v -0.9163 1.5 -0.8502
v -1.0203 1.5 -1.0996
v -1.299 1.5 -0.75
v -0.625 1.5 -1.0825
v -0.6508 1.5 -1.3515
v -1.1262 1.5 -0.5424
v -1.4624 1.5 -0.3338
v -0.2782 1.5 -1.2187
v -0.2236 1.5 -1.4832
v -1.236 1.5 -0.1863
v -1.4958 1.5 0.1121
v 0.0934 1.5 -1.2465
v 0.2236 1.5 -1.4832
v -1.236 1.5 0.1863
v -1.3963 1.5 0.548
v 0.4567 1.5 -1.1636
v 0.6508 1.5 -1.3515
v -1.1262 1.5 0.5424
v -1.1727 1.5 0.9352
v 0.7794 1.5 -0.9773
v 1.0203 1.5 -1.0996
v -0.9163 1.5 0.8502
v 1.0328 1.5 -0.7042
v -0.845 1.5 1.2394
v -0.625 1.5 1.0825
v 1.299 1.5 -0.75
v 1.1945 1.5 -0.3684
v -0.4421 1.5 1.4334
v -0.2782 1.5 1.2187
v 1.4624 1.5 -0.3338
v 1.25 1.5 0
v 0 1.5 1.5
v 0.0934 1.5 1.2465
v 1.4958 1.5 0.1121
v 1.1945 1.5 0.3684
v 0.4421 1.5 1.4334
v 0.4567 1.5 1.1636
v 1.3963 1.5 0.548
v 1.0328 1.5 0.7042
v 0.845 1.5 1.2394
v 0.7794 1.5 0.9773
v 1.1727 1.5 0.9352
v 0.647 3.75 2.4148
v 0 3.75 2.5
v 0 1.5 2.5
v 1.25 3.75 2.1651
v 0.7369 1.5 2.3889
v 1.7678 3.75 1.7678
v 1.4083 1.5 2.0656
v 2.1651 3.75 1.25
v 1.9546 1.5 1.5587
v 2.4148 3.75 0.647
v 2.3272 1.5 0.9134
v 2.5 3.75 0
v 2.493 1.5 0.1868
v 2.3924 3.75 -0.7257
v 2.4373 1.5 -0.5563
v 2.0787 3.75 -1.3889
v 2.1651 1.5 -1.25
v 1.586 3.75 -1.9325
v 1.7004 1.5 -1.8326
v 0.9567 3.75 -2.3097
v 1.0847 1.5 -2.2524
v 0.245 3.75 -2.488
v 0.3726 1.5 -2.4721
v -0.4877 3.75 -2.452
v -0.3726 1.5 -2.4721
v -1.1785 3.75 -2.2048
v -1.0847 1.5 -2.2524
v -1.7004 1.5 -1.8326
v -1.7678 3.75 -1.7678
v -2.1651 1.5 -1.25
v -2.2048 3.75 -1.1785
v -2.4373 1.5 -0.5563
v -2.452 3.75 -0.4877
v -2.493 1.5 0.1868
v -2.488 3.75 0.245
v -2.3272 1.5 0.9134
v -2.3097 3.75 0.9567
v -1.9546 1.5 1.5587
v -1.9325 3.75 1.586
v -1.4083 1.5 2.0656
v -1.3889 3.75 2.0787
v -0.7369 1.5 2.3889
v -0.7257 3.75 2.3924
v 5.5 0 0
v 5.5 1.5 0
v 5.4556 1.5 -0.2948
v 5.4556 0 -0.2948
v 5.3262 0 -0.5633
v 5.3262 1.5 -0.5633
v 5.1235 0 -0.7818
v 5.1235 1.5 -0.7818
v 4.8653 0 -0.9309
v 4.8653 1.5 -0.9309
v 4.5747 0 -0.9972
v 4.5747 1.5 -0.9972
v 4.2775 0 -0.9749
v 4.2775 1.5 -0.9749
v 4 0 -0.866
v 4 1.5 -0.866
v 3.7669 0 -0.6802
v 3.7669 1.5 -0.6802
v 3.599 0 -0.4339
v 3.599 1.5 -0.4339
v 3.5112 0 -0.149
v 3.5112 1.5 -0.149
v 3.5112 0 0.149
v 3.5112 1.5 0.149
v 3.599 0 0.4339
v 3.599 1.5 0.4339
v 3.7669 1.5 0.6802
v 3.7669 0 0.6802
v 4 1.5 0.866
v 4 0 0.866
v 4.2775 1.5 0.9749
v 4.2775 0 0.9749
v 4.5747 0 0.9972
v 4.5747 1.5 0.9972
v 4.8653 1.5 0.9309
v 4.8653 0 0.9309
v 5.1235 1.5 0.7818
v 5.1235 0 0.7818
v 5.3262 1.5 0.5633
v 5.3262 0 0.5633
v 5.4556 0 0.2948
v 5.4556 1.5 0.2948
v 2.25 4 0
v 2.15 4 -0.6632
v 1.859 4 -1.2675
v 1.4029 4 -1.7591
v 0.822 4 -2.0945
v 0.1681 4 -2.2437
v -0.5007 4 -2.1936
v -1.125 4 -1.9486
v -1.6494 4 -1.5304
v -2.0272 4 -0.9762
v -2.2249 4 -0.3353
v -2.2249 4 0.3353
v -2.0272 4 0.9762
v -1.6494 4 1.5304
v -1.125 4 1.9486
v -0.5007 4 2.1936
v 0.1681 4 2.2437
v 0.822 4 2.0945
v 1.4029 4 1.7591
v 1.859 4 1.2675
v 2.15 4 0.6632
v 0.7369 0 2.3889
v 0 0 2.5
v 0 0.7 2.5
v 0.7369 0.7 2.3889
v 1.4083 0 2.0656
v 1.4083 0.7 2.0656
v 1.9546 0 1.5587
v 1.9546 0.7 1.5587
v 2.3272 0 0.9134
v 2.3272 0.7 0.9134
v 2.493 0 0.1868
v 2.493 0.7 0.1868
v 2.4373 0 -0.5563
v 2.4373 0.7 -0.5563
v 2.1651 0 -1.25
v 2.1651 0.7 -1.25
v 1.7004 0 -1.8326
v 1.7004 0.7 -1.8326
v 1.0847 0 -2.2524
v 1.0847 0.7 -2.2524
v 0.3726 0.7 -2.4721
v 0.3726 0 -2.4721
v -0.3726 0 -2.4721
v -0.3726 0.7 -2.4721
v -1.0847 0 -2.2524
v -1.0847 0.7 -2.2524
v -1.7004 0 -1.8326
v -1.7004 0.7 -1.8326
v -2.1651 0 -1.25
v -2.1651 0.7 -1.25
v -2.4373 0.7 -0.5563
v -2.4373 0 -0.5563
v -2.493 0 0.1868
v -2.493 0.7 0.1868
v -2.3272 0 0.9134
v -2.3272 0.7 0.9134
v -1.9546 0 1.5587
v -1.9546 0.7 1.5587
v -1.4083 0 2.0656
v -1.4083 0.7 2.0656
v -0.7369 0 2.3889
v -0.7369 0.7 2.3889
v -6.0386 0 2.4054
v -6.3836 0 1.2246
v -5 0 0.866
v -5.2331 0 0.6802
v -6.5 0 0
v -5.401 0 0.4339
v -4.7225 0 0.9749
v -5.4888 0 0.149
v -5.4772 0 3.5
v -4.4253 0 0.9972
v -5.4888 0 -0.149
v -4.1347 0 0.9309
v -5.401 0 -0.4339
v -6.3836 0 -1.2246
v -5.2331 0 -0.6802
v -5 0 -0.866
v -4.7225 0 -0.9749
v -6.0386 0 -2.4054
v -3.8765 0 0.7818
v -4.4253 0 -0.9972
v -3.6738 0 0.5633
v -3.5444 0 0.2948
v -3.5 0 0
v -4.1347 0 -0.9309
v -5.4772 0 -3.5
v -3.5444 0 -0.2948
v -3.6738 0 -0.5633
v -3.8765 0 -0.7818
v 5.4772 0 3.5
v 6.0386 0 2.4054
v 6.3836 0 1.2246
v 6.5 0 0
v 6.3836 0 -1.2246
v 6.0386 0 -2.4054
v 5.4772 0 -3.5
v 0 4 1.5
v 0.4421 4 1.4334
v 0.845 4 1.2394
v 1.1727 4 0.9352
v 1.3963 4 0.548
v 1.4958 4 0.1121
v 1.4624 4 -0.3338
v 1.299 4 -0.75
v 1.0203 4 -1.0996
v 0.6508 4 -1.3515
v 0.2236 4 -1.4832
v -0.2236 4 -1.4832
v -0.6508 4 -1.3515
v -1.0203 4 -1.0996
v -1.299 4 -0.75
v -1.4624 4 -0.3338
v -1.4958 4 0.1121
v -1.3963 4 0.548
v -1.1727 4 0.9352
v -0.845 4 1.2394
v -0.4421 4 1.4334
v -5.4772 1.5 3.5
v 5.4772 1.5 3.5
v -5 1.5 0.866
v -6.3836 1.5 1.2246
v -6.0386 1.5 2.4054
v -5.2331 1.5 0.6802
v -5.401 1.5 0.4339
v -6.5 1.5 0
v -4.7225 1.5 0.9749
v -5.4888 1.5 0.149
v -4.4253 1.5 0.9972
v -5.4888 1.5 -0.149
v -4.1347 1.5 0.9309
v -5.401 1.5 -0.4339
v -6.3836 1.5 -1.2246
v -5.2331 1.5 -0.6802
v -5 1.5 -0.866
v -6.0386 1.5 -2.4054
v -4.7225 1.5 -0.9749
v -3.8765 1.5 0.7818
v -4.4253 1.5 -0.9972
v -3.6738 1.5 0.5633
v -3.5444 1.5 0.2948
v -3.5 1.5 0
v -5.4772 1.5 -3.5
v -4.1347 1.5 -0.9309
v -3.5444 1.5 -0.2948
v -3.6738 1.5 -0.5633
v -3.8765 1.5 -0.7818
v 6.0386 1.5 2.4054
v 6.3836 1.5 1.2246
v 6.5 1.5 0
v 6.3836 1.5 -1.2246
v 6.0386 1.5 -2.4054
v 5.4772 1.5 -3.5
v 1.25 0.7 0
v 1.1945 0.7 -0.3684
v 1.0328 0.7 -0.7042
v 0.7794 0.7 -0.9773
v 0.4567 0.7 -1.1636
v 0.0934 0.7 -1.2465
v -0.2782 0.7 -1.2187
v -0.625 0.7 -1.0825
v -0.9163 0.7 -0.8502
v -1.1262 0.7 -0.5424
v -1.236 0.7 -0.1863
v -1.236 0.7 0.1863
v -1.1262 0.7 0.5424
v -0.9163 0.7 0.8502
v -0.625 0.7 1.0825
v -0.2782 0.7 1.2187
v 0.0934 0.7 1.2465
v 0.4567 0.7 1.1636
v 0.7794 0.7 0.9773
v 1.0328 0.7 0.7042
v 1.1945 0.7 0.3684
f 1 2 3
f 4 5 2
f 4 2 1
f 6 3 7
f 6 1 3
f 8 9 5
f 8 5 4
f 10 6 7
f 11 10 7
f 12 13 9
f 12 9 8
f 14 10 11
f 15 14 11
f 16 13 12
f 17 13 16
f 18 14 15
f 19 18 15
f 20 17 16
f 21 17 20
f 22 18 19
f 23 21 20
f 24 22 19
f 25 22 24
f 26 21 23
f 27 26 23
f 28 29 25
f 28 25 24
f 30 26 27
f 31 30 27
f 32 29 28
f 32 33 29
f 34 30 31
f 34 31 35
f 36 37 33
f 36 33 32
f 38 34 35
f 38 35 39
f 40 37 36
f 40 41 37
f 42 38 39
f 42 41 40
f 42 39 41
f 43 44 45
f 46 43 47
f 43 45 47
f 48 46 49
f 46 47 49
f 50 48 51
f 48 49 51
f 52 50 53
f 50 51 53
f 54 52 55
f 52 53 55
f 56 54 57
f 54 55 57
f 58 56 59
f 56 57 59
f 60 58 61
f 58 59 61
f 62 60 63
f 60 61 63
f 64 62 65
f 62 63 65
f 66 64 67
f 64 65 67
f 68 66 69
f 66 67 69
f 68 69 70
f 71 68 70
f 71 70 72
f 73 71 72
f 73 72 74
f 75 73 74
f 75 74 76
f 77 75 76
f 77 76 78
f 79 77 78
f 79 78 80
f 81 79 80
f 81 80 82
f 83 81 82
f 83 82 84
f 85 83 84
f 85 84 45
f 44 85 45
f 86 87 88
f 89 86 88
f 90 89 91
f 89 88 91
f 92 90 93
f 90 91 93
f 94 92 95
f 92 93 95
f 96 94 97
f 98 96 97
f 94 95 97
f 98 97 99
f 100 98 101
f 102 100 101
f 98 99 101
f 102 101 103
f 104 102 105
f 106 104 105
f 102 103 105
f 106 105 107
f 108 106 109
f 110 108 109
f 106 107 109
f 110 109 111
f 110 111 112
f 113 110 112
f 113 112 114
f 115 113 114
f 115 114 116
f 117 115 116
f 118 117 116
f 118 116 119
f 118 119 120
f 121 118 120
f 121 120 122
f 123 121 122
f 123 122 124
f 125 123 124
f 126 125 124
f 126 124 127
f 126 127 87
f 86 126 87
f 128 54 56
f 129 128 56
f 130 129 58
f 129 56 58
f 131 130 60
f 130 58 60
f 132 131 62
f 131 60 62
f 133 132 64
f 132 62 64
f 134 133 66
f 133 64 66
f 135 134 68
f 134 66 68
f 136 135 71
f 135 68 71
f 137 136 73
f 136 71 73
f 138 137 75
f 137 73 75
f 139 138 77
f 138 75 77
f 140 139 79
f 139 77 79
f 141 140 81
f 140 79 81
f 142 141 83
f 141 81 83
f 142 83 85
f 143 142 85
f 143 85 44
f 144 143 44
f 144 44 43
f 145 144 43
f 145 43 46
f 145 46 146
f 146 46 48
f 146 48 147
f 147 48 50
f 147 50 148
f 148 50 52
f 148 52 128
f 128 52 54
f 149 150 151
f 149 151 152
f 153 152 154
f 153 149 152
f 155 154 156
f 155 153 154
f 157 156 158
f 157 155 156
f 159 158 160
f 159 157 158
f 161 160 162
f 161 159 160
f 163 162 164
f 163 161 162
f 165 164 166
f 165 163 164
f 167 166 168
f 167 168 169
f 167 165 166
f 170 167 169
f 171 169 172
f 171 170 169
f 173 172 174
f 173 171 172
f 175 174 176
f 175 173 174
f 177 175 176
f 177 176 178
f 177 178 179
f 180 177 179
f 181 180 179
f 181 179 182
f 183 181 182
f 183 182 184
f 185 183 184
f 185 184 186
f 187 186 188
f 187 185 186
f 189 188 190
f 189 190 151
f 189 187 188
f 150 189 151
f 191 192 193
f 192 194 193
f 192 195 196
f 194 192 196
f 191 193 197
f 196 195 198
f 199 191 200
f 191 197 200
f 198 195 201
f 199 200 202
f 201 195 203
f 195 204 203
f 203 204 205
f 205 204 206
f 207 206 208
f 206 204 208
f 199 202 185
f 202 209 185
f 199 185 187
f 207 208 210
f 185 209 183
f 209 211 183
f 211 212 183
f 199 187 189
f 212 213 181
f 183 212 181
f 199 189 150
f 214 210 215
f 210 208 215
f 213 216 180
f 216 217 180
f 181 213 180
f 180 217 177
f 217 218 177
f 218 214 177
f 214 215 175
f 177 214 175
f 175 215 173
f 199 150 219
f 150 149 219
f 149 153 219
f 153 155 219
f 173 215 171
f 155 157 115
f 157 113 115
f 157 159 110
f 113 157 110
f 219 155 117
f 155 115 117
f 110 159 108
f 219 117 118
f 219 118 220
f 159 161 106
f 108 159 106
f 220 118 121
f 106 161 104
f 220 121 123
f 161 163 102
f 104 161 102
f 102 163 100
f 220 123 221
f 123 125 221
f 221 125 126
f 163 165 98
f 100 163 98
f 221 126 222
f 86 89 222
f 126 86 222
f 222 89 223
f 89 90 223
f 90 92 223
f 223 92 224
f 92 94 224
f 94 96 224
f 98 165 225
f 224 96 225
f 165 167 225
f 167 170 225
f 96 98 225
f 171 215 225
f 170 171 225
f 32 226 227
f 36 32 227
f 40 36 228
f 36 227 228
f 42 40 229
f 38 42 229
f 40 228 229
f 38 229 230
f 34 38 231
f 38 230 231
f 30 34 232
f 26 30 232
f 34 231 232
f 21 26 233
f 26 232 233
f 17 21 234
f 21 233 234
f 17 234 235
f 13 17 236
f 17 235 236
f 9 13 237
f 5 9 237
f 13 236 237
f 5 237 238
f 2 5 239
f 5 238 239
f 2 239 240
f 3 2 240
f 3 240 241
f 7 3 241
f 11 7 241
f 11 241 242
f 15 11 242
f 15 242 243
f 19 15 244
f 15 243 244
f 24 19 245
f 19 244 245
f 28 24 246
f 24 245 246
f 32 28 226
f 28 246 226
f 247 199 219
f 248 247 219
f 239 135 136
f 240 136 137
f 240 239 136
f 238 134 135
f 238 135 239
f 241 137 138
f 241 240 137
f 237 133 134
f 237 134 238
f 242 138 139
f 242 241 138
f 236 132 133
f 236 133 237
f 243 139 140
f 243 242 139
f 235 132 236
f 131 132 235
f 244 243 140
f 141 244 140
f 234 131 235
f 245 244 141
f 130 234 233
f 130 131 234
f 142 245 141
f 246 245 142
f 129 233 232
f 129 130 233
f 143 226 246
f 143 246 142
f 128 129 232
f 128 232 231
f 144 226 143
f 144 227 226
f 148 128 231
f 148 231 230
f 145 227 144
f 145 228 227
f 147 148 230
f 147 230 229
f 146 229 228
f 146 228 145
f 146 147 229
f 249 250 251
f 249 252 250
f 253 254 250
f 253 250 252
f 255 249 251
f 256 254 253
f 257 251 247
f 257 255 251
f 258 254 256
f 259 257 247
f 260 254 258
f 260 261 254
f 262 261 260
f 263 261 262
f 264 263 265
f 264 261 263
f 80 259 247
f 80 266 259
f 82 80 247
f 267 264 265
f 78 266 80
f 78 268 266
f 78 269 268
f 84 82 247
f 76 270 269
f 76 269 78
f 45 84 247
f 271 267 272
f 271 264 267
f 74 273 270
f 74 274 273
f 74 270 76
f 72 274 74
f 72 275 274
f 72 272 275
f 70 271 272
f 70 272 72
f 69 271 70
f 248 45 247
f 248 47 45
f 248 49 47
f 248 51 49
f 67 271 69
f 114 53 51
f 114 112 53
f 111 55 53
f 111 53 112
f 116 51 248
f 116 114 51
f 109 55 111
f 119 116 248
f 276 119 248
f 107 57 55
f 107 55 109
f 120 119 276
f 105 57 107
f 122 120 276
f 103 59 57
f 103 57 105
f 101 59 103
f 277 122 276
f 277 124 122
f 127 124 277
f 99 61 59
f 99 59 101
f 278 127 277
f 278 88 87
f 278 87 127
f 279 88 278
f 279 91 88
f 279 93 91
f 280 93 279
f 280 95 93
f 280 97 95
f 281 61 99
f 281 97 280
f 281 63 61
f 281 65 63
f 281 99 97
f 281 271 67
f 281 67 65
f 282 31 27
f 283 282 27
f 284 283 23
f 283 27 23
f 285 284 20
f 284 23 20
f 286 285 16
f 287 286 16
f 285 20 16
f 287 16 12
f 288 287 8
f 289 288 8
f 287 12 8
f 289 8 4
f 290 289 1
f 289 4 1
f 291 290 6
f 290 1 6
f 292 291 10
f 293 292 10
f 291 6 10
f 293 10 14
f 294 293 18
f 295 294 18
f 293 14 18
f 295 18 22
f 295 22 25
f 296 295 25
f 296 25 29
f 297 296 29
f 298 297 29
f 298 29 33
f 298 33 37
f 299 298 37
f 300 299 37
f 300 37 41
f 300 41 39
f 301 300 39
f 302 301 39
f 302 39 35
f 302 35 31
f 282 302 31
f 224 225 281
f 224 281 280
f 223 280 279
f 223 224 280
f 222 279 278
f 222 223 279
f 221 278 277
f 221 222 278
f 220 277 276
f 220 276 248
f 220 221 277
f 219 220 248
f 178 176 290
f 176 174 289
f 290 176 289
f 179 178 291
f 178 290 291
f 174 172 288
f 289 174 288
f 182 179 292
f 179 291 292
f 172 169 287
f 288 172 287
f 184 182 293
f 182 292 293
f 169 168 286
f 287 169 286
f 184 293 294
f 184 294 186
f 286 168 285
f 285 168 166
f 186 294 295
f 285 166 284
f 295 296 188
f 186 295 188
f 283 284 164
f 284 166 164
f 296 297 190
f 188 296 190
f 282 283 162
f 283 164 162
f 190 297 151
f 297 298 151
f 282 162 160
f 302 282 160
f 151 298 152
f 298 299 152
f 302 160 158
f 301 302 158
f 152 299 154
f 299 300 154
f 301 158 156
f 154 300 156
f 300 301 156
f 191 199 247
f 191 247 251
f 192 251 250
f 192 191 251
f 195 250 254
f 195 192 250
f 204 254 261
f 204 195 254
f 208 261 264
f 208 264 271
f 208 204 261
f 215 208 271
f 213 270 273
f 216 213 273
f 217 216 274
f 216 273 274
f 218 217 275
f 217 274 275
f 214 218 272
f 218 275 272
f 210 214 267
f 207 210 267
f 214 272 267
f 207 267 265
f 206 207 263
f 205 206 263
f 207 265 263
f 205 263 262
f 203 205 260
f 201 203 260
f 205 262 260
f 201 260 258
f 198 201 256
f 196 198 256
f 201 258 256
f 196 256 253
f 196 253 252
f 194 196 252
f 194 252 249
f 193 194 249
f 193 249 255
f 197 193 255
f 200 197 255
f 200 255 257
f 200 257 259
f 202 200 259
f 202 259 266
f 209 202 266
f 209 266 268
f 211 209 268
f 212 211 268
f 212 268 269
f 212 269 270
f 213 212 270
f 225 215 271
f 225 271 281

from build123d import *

# Parameters (mm, degrees)
BASE_SKETCH_W              = 10.95445115
BASE_SKETCH_H              = 7
BASE_EXTRUDE_DEPTH         = 1.5
PROTRUSION_START           = 1.5
F_5MM_DIAMETER_SKETCH_R    = 2.5
PROTRUSION_EXTRUDE_DEPTH   = 2.5
F_5MM_DIAMETER_SKETCH_2_R  = 2.5
F_5MM_BOTTOM_CUT_DEPTH     = 0.7
F_2_0_2_DIAMETER_HOLE1_D   = 2
F_2_5_2_5_DIAMETER_HOLE1_D = 2.5
CUT_EXTRUDE2_START         = 4
F_3MM_DIAMETER_SKETCH_R    = 1.5
CUT_EXTRUDE2_DEPTH         = 2.5


with BuildPart() as part:
    # Base Sketch → Base Extrude (new body)
    with BuildSketch(Plane(origin=(0, 0, 0), x_dir=(1, 0, 0), z_dir=(0, 1, 0))):
        Rectangle(BASE_SKETCH_W, BASE_SKETCH_H)
        with BuildLine():
            ThreePointArc((-5.477225575, -3.5), (-6.5, 0), (-5.477225575, 3.5))
            Line((-5.477225575, 3.5), (-5.477225575, -3.5))
        make_face()
        with BuildLine():
            ThreePointArc((5.477225575, 3.5), (6.5, 0), (5.477225575, -3.5))
            Line((5.477225575, -3.5), (5.477225575, 3.5))
        make_face()
    extrude(amount=BASE_EXTRUDE_DEPTH)

    # 5mm diameter Sketch → Protrusion Extrude (add)
    with BuildSketch(Plane(origin=(0, 0, 0), x_dir=(1, 0, 0), z_dir=(0, 1, 0)).offset(PROTRUSION_START)):
        with Locations(Location((0, 0, 0), (0, 0, 270))):
            Circle(F_5MM_DIAMETER_SKETCH_R)
    extrude(amount=PROTRUSION_EXTRUDE_DEPTH)

    # 5mm diameter Sketch<2> → 5mm Bottom Cut (cut)
    with BuildSketch(Plane(origin=(0, 0, 0), x_dir=(1, 0, 0), z_dir=(0, 1, 0))):
        with Locations(Location((0, 0, 0), (0, 0, 270))):
            Circle(F_5MM_DIAMETER_SKETCH_2_R)
    extrude(amount=F_5MM_BOTTOM_CUT_DEPTH, mode=Mode.SUBTRACT)

    # Chamfer1: read off the stored shape, not the designer's step
    # Chamfer1 outline → Chamfer1 (revolve, cut)
    with BuildSketch(Plane.XY):
        Polygon((2.5, 4), (2.25, 4), (2.5, 3.75), align=None)
    revolve(axis=Axis((0, 0, 0), (0, 1, 0)), mode=Mode.SUBTRACT)

    # Ø2.0 (2) Diameter Hole1 (through all)
    with Locations(Plane(origin=(0, 0, 0), x_dir=(-1, 0, 0), z_dir=(0, -1, 0))):
        with Locations((4.5, 0), (-4.5, 0)):
            Hole(F_2_0_2_DIAMETER_HOLE1_D / 2)

    # Ø2.5 (2.5) Diameter Hole1 (through all)
    with Locations(Plane(origin=(0, 0.7, 0), x_dir=(-1, 0, 0), z_dir=(0, -1, 0))):
        with Locations((0, 0)):
            Hole(F_2_5_2_5_DIAMETER_HOLE1_D / 2)

    # 3mm Diameter Sketch → Cut-Extrude2 (cut)
    with BuildSketch(Plane(origin=(0, 0, 0), x_dir=(1, 0, 0), z_dir=(0, 1, 0)).offset(CUT_EXTRUDE2_START)):
        with Locations(Location((0, 0, 0), (0, 0, 270))):
            Circle(F_3MM_DIAMETER_SKETCH_R)
    extrude(amount=-CUT_EXTRUDE2_DEPTH, mode=Mode.SUBTRACT)


solid = part.part
